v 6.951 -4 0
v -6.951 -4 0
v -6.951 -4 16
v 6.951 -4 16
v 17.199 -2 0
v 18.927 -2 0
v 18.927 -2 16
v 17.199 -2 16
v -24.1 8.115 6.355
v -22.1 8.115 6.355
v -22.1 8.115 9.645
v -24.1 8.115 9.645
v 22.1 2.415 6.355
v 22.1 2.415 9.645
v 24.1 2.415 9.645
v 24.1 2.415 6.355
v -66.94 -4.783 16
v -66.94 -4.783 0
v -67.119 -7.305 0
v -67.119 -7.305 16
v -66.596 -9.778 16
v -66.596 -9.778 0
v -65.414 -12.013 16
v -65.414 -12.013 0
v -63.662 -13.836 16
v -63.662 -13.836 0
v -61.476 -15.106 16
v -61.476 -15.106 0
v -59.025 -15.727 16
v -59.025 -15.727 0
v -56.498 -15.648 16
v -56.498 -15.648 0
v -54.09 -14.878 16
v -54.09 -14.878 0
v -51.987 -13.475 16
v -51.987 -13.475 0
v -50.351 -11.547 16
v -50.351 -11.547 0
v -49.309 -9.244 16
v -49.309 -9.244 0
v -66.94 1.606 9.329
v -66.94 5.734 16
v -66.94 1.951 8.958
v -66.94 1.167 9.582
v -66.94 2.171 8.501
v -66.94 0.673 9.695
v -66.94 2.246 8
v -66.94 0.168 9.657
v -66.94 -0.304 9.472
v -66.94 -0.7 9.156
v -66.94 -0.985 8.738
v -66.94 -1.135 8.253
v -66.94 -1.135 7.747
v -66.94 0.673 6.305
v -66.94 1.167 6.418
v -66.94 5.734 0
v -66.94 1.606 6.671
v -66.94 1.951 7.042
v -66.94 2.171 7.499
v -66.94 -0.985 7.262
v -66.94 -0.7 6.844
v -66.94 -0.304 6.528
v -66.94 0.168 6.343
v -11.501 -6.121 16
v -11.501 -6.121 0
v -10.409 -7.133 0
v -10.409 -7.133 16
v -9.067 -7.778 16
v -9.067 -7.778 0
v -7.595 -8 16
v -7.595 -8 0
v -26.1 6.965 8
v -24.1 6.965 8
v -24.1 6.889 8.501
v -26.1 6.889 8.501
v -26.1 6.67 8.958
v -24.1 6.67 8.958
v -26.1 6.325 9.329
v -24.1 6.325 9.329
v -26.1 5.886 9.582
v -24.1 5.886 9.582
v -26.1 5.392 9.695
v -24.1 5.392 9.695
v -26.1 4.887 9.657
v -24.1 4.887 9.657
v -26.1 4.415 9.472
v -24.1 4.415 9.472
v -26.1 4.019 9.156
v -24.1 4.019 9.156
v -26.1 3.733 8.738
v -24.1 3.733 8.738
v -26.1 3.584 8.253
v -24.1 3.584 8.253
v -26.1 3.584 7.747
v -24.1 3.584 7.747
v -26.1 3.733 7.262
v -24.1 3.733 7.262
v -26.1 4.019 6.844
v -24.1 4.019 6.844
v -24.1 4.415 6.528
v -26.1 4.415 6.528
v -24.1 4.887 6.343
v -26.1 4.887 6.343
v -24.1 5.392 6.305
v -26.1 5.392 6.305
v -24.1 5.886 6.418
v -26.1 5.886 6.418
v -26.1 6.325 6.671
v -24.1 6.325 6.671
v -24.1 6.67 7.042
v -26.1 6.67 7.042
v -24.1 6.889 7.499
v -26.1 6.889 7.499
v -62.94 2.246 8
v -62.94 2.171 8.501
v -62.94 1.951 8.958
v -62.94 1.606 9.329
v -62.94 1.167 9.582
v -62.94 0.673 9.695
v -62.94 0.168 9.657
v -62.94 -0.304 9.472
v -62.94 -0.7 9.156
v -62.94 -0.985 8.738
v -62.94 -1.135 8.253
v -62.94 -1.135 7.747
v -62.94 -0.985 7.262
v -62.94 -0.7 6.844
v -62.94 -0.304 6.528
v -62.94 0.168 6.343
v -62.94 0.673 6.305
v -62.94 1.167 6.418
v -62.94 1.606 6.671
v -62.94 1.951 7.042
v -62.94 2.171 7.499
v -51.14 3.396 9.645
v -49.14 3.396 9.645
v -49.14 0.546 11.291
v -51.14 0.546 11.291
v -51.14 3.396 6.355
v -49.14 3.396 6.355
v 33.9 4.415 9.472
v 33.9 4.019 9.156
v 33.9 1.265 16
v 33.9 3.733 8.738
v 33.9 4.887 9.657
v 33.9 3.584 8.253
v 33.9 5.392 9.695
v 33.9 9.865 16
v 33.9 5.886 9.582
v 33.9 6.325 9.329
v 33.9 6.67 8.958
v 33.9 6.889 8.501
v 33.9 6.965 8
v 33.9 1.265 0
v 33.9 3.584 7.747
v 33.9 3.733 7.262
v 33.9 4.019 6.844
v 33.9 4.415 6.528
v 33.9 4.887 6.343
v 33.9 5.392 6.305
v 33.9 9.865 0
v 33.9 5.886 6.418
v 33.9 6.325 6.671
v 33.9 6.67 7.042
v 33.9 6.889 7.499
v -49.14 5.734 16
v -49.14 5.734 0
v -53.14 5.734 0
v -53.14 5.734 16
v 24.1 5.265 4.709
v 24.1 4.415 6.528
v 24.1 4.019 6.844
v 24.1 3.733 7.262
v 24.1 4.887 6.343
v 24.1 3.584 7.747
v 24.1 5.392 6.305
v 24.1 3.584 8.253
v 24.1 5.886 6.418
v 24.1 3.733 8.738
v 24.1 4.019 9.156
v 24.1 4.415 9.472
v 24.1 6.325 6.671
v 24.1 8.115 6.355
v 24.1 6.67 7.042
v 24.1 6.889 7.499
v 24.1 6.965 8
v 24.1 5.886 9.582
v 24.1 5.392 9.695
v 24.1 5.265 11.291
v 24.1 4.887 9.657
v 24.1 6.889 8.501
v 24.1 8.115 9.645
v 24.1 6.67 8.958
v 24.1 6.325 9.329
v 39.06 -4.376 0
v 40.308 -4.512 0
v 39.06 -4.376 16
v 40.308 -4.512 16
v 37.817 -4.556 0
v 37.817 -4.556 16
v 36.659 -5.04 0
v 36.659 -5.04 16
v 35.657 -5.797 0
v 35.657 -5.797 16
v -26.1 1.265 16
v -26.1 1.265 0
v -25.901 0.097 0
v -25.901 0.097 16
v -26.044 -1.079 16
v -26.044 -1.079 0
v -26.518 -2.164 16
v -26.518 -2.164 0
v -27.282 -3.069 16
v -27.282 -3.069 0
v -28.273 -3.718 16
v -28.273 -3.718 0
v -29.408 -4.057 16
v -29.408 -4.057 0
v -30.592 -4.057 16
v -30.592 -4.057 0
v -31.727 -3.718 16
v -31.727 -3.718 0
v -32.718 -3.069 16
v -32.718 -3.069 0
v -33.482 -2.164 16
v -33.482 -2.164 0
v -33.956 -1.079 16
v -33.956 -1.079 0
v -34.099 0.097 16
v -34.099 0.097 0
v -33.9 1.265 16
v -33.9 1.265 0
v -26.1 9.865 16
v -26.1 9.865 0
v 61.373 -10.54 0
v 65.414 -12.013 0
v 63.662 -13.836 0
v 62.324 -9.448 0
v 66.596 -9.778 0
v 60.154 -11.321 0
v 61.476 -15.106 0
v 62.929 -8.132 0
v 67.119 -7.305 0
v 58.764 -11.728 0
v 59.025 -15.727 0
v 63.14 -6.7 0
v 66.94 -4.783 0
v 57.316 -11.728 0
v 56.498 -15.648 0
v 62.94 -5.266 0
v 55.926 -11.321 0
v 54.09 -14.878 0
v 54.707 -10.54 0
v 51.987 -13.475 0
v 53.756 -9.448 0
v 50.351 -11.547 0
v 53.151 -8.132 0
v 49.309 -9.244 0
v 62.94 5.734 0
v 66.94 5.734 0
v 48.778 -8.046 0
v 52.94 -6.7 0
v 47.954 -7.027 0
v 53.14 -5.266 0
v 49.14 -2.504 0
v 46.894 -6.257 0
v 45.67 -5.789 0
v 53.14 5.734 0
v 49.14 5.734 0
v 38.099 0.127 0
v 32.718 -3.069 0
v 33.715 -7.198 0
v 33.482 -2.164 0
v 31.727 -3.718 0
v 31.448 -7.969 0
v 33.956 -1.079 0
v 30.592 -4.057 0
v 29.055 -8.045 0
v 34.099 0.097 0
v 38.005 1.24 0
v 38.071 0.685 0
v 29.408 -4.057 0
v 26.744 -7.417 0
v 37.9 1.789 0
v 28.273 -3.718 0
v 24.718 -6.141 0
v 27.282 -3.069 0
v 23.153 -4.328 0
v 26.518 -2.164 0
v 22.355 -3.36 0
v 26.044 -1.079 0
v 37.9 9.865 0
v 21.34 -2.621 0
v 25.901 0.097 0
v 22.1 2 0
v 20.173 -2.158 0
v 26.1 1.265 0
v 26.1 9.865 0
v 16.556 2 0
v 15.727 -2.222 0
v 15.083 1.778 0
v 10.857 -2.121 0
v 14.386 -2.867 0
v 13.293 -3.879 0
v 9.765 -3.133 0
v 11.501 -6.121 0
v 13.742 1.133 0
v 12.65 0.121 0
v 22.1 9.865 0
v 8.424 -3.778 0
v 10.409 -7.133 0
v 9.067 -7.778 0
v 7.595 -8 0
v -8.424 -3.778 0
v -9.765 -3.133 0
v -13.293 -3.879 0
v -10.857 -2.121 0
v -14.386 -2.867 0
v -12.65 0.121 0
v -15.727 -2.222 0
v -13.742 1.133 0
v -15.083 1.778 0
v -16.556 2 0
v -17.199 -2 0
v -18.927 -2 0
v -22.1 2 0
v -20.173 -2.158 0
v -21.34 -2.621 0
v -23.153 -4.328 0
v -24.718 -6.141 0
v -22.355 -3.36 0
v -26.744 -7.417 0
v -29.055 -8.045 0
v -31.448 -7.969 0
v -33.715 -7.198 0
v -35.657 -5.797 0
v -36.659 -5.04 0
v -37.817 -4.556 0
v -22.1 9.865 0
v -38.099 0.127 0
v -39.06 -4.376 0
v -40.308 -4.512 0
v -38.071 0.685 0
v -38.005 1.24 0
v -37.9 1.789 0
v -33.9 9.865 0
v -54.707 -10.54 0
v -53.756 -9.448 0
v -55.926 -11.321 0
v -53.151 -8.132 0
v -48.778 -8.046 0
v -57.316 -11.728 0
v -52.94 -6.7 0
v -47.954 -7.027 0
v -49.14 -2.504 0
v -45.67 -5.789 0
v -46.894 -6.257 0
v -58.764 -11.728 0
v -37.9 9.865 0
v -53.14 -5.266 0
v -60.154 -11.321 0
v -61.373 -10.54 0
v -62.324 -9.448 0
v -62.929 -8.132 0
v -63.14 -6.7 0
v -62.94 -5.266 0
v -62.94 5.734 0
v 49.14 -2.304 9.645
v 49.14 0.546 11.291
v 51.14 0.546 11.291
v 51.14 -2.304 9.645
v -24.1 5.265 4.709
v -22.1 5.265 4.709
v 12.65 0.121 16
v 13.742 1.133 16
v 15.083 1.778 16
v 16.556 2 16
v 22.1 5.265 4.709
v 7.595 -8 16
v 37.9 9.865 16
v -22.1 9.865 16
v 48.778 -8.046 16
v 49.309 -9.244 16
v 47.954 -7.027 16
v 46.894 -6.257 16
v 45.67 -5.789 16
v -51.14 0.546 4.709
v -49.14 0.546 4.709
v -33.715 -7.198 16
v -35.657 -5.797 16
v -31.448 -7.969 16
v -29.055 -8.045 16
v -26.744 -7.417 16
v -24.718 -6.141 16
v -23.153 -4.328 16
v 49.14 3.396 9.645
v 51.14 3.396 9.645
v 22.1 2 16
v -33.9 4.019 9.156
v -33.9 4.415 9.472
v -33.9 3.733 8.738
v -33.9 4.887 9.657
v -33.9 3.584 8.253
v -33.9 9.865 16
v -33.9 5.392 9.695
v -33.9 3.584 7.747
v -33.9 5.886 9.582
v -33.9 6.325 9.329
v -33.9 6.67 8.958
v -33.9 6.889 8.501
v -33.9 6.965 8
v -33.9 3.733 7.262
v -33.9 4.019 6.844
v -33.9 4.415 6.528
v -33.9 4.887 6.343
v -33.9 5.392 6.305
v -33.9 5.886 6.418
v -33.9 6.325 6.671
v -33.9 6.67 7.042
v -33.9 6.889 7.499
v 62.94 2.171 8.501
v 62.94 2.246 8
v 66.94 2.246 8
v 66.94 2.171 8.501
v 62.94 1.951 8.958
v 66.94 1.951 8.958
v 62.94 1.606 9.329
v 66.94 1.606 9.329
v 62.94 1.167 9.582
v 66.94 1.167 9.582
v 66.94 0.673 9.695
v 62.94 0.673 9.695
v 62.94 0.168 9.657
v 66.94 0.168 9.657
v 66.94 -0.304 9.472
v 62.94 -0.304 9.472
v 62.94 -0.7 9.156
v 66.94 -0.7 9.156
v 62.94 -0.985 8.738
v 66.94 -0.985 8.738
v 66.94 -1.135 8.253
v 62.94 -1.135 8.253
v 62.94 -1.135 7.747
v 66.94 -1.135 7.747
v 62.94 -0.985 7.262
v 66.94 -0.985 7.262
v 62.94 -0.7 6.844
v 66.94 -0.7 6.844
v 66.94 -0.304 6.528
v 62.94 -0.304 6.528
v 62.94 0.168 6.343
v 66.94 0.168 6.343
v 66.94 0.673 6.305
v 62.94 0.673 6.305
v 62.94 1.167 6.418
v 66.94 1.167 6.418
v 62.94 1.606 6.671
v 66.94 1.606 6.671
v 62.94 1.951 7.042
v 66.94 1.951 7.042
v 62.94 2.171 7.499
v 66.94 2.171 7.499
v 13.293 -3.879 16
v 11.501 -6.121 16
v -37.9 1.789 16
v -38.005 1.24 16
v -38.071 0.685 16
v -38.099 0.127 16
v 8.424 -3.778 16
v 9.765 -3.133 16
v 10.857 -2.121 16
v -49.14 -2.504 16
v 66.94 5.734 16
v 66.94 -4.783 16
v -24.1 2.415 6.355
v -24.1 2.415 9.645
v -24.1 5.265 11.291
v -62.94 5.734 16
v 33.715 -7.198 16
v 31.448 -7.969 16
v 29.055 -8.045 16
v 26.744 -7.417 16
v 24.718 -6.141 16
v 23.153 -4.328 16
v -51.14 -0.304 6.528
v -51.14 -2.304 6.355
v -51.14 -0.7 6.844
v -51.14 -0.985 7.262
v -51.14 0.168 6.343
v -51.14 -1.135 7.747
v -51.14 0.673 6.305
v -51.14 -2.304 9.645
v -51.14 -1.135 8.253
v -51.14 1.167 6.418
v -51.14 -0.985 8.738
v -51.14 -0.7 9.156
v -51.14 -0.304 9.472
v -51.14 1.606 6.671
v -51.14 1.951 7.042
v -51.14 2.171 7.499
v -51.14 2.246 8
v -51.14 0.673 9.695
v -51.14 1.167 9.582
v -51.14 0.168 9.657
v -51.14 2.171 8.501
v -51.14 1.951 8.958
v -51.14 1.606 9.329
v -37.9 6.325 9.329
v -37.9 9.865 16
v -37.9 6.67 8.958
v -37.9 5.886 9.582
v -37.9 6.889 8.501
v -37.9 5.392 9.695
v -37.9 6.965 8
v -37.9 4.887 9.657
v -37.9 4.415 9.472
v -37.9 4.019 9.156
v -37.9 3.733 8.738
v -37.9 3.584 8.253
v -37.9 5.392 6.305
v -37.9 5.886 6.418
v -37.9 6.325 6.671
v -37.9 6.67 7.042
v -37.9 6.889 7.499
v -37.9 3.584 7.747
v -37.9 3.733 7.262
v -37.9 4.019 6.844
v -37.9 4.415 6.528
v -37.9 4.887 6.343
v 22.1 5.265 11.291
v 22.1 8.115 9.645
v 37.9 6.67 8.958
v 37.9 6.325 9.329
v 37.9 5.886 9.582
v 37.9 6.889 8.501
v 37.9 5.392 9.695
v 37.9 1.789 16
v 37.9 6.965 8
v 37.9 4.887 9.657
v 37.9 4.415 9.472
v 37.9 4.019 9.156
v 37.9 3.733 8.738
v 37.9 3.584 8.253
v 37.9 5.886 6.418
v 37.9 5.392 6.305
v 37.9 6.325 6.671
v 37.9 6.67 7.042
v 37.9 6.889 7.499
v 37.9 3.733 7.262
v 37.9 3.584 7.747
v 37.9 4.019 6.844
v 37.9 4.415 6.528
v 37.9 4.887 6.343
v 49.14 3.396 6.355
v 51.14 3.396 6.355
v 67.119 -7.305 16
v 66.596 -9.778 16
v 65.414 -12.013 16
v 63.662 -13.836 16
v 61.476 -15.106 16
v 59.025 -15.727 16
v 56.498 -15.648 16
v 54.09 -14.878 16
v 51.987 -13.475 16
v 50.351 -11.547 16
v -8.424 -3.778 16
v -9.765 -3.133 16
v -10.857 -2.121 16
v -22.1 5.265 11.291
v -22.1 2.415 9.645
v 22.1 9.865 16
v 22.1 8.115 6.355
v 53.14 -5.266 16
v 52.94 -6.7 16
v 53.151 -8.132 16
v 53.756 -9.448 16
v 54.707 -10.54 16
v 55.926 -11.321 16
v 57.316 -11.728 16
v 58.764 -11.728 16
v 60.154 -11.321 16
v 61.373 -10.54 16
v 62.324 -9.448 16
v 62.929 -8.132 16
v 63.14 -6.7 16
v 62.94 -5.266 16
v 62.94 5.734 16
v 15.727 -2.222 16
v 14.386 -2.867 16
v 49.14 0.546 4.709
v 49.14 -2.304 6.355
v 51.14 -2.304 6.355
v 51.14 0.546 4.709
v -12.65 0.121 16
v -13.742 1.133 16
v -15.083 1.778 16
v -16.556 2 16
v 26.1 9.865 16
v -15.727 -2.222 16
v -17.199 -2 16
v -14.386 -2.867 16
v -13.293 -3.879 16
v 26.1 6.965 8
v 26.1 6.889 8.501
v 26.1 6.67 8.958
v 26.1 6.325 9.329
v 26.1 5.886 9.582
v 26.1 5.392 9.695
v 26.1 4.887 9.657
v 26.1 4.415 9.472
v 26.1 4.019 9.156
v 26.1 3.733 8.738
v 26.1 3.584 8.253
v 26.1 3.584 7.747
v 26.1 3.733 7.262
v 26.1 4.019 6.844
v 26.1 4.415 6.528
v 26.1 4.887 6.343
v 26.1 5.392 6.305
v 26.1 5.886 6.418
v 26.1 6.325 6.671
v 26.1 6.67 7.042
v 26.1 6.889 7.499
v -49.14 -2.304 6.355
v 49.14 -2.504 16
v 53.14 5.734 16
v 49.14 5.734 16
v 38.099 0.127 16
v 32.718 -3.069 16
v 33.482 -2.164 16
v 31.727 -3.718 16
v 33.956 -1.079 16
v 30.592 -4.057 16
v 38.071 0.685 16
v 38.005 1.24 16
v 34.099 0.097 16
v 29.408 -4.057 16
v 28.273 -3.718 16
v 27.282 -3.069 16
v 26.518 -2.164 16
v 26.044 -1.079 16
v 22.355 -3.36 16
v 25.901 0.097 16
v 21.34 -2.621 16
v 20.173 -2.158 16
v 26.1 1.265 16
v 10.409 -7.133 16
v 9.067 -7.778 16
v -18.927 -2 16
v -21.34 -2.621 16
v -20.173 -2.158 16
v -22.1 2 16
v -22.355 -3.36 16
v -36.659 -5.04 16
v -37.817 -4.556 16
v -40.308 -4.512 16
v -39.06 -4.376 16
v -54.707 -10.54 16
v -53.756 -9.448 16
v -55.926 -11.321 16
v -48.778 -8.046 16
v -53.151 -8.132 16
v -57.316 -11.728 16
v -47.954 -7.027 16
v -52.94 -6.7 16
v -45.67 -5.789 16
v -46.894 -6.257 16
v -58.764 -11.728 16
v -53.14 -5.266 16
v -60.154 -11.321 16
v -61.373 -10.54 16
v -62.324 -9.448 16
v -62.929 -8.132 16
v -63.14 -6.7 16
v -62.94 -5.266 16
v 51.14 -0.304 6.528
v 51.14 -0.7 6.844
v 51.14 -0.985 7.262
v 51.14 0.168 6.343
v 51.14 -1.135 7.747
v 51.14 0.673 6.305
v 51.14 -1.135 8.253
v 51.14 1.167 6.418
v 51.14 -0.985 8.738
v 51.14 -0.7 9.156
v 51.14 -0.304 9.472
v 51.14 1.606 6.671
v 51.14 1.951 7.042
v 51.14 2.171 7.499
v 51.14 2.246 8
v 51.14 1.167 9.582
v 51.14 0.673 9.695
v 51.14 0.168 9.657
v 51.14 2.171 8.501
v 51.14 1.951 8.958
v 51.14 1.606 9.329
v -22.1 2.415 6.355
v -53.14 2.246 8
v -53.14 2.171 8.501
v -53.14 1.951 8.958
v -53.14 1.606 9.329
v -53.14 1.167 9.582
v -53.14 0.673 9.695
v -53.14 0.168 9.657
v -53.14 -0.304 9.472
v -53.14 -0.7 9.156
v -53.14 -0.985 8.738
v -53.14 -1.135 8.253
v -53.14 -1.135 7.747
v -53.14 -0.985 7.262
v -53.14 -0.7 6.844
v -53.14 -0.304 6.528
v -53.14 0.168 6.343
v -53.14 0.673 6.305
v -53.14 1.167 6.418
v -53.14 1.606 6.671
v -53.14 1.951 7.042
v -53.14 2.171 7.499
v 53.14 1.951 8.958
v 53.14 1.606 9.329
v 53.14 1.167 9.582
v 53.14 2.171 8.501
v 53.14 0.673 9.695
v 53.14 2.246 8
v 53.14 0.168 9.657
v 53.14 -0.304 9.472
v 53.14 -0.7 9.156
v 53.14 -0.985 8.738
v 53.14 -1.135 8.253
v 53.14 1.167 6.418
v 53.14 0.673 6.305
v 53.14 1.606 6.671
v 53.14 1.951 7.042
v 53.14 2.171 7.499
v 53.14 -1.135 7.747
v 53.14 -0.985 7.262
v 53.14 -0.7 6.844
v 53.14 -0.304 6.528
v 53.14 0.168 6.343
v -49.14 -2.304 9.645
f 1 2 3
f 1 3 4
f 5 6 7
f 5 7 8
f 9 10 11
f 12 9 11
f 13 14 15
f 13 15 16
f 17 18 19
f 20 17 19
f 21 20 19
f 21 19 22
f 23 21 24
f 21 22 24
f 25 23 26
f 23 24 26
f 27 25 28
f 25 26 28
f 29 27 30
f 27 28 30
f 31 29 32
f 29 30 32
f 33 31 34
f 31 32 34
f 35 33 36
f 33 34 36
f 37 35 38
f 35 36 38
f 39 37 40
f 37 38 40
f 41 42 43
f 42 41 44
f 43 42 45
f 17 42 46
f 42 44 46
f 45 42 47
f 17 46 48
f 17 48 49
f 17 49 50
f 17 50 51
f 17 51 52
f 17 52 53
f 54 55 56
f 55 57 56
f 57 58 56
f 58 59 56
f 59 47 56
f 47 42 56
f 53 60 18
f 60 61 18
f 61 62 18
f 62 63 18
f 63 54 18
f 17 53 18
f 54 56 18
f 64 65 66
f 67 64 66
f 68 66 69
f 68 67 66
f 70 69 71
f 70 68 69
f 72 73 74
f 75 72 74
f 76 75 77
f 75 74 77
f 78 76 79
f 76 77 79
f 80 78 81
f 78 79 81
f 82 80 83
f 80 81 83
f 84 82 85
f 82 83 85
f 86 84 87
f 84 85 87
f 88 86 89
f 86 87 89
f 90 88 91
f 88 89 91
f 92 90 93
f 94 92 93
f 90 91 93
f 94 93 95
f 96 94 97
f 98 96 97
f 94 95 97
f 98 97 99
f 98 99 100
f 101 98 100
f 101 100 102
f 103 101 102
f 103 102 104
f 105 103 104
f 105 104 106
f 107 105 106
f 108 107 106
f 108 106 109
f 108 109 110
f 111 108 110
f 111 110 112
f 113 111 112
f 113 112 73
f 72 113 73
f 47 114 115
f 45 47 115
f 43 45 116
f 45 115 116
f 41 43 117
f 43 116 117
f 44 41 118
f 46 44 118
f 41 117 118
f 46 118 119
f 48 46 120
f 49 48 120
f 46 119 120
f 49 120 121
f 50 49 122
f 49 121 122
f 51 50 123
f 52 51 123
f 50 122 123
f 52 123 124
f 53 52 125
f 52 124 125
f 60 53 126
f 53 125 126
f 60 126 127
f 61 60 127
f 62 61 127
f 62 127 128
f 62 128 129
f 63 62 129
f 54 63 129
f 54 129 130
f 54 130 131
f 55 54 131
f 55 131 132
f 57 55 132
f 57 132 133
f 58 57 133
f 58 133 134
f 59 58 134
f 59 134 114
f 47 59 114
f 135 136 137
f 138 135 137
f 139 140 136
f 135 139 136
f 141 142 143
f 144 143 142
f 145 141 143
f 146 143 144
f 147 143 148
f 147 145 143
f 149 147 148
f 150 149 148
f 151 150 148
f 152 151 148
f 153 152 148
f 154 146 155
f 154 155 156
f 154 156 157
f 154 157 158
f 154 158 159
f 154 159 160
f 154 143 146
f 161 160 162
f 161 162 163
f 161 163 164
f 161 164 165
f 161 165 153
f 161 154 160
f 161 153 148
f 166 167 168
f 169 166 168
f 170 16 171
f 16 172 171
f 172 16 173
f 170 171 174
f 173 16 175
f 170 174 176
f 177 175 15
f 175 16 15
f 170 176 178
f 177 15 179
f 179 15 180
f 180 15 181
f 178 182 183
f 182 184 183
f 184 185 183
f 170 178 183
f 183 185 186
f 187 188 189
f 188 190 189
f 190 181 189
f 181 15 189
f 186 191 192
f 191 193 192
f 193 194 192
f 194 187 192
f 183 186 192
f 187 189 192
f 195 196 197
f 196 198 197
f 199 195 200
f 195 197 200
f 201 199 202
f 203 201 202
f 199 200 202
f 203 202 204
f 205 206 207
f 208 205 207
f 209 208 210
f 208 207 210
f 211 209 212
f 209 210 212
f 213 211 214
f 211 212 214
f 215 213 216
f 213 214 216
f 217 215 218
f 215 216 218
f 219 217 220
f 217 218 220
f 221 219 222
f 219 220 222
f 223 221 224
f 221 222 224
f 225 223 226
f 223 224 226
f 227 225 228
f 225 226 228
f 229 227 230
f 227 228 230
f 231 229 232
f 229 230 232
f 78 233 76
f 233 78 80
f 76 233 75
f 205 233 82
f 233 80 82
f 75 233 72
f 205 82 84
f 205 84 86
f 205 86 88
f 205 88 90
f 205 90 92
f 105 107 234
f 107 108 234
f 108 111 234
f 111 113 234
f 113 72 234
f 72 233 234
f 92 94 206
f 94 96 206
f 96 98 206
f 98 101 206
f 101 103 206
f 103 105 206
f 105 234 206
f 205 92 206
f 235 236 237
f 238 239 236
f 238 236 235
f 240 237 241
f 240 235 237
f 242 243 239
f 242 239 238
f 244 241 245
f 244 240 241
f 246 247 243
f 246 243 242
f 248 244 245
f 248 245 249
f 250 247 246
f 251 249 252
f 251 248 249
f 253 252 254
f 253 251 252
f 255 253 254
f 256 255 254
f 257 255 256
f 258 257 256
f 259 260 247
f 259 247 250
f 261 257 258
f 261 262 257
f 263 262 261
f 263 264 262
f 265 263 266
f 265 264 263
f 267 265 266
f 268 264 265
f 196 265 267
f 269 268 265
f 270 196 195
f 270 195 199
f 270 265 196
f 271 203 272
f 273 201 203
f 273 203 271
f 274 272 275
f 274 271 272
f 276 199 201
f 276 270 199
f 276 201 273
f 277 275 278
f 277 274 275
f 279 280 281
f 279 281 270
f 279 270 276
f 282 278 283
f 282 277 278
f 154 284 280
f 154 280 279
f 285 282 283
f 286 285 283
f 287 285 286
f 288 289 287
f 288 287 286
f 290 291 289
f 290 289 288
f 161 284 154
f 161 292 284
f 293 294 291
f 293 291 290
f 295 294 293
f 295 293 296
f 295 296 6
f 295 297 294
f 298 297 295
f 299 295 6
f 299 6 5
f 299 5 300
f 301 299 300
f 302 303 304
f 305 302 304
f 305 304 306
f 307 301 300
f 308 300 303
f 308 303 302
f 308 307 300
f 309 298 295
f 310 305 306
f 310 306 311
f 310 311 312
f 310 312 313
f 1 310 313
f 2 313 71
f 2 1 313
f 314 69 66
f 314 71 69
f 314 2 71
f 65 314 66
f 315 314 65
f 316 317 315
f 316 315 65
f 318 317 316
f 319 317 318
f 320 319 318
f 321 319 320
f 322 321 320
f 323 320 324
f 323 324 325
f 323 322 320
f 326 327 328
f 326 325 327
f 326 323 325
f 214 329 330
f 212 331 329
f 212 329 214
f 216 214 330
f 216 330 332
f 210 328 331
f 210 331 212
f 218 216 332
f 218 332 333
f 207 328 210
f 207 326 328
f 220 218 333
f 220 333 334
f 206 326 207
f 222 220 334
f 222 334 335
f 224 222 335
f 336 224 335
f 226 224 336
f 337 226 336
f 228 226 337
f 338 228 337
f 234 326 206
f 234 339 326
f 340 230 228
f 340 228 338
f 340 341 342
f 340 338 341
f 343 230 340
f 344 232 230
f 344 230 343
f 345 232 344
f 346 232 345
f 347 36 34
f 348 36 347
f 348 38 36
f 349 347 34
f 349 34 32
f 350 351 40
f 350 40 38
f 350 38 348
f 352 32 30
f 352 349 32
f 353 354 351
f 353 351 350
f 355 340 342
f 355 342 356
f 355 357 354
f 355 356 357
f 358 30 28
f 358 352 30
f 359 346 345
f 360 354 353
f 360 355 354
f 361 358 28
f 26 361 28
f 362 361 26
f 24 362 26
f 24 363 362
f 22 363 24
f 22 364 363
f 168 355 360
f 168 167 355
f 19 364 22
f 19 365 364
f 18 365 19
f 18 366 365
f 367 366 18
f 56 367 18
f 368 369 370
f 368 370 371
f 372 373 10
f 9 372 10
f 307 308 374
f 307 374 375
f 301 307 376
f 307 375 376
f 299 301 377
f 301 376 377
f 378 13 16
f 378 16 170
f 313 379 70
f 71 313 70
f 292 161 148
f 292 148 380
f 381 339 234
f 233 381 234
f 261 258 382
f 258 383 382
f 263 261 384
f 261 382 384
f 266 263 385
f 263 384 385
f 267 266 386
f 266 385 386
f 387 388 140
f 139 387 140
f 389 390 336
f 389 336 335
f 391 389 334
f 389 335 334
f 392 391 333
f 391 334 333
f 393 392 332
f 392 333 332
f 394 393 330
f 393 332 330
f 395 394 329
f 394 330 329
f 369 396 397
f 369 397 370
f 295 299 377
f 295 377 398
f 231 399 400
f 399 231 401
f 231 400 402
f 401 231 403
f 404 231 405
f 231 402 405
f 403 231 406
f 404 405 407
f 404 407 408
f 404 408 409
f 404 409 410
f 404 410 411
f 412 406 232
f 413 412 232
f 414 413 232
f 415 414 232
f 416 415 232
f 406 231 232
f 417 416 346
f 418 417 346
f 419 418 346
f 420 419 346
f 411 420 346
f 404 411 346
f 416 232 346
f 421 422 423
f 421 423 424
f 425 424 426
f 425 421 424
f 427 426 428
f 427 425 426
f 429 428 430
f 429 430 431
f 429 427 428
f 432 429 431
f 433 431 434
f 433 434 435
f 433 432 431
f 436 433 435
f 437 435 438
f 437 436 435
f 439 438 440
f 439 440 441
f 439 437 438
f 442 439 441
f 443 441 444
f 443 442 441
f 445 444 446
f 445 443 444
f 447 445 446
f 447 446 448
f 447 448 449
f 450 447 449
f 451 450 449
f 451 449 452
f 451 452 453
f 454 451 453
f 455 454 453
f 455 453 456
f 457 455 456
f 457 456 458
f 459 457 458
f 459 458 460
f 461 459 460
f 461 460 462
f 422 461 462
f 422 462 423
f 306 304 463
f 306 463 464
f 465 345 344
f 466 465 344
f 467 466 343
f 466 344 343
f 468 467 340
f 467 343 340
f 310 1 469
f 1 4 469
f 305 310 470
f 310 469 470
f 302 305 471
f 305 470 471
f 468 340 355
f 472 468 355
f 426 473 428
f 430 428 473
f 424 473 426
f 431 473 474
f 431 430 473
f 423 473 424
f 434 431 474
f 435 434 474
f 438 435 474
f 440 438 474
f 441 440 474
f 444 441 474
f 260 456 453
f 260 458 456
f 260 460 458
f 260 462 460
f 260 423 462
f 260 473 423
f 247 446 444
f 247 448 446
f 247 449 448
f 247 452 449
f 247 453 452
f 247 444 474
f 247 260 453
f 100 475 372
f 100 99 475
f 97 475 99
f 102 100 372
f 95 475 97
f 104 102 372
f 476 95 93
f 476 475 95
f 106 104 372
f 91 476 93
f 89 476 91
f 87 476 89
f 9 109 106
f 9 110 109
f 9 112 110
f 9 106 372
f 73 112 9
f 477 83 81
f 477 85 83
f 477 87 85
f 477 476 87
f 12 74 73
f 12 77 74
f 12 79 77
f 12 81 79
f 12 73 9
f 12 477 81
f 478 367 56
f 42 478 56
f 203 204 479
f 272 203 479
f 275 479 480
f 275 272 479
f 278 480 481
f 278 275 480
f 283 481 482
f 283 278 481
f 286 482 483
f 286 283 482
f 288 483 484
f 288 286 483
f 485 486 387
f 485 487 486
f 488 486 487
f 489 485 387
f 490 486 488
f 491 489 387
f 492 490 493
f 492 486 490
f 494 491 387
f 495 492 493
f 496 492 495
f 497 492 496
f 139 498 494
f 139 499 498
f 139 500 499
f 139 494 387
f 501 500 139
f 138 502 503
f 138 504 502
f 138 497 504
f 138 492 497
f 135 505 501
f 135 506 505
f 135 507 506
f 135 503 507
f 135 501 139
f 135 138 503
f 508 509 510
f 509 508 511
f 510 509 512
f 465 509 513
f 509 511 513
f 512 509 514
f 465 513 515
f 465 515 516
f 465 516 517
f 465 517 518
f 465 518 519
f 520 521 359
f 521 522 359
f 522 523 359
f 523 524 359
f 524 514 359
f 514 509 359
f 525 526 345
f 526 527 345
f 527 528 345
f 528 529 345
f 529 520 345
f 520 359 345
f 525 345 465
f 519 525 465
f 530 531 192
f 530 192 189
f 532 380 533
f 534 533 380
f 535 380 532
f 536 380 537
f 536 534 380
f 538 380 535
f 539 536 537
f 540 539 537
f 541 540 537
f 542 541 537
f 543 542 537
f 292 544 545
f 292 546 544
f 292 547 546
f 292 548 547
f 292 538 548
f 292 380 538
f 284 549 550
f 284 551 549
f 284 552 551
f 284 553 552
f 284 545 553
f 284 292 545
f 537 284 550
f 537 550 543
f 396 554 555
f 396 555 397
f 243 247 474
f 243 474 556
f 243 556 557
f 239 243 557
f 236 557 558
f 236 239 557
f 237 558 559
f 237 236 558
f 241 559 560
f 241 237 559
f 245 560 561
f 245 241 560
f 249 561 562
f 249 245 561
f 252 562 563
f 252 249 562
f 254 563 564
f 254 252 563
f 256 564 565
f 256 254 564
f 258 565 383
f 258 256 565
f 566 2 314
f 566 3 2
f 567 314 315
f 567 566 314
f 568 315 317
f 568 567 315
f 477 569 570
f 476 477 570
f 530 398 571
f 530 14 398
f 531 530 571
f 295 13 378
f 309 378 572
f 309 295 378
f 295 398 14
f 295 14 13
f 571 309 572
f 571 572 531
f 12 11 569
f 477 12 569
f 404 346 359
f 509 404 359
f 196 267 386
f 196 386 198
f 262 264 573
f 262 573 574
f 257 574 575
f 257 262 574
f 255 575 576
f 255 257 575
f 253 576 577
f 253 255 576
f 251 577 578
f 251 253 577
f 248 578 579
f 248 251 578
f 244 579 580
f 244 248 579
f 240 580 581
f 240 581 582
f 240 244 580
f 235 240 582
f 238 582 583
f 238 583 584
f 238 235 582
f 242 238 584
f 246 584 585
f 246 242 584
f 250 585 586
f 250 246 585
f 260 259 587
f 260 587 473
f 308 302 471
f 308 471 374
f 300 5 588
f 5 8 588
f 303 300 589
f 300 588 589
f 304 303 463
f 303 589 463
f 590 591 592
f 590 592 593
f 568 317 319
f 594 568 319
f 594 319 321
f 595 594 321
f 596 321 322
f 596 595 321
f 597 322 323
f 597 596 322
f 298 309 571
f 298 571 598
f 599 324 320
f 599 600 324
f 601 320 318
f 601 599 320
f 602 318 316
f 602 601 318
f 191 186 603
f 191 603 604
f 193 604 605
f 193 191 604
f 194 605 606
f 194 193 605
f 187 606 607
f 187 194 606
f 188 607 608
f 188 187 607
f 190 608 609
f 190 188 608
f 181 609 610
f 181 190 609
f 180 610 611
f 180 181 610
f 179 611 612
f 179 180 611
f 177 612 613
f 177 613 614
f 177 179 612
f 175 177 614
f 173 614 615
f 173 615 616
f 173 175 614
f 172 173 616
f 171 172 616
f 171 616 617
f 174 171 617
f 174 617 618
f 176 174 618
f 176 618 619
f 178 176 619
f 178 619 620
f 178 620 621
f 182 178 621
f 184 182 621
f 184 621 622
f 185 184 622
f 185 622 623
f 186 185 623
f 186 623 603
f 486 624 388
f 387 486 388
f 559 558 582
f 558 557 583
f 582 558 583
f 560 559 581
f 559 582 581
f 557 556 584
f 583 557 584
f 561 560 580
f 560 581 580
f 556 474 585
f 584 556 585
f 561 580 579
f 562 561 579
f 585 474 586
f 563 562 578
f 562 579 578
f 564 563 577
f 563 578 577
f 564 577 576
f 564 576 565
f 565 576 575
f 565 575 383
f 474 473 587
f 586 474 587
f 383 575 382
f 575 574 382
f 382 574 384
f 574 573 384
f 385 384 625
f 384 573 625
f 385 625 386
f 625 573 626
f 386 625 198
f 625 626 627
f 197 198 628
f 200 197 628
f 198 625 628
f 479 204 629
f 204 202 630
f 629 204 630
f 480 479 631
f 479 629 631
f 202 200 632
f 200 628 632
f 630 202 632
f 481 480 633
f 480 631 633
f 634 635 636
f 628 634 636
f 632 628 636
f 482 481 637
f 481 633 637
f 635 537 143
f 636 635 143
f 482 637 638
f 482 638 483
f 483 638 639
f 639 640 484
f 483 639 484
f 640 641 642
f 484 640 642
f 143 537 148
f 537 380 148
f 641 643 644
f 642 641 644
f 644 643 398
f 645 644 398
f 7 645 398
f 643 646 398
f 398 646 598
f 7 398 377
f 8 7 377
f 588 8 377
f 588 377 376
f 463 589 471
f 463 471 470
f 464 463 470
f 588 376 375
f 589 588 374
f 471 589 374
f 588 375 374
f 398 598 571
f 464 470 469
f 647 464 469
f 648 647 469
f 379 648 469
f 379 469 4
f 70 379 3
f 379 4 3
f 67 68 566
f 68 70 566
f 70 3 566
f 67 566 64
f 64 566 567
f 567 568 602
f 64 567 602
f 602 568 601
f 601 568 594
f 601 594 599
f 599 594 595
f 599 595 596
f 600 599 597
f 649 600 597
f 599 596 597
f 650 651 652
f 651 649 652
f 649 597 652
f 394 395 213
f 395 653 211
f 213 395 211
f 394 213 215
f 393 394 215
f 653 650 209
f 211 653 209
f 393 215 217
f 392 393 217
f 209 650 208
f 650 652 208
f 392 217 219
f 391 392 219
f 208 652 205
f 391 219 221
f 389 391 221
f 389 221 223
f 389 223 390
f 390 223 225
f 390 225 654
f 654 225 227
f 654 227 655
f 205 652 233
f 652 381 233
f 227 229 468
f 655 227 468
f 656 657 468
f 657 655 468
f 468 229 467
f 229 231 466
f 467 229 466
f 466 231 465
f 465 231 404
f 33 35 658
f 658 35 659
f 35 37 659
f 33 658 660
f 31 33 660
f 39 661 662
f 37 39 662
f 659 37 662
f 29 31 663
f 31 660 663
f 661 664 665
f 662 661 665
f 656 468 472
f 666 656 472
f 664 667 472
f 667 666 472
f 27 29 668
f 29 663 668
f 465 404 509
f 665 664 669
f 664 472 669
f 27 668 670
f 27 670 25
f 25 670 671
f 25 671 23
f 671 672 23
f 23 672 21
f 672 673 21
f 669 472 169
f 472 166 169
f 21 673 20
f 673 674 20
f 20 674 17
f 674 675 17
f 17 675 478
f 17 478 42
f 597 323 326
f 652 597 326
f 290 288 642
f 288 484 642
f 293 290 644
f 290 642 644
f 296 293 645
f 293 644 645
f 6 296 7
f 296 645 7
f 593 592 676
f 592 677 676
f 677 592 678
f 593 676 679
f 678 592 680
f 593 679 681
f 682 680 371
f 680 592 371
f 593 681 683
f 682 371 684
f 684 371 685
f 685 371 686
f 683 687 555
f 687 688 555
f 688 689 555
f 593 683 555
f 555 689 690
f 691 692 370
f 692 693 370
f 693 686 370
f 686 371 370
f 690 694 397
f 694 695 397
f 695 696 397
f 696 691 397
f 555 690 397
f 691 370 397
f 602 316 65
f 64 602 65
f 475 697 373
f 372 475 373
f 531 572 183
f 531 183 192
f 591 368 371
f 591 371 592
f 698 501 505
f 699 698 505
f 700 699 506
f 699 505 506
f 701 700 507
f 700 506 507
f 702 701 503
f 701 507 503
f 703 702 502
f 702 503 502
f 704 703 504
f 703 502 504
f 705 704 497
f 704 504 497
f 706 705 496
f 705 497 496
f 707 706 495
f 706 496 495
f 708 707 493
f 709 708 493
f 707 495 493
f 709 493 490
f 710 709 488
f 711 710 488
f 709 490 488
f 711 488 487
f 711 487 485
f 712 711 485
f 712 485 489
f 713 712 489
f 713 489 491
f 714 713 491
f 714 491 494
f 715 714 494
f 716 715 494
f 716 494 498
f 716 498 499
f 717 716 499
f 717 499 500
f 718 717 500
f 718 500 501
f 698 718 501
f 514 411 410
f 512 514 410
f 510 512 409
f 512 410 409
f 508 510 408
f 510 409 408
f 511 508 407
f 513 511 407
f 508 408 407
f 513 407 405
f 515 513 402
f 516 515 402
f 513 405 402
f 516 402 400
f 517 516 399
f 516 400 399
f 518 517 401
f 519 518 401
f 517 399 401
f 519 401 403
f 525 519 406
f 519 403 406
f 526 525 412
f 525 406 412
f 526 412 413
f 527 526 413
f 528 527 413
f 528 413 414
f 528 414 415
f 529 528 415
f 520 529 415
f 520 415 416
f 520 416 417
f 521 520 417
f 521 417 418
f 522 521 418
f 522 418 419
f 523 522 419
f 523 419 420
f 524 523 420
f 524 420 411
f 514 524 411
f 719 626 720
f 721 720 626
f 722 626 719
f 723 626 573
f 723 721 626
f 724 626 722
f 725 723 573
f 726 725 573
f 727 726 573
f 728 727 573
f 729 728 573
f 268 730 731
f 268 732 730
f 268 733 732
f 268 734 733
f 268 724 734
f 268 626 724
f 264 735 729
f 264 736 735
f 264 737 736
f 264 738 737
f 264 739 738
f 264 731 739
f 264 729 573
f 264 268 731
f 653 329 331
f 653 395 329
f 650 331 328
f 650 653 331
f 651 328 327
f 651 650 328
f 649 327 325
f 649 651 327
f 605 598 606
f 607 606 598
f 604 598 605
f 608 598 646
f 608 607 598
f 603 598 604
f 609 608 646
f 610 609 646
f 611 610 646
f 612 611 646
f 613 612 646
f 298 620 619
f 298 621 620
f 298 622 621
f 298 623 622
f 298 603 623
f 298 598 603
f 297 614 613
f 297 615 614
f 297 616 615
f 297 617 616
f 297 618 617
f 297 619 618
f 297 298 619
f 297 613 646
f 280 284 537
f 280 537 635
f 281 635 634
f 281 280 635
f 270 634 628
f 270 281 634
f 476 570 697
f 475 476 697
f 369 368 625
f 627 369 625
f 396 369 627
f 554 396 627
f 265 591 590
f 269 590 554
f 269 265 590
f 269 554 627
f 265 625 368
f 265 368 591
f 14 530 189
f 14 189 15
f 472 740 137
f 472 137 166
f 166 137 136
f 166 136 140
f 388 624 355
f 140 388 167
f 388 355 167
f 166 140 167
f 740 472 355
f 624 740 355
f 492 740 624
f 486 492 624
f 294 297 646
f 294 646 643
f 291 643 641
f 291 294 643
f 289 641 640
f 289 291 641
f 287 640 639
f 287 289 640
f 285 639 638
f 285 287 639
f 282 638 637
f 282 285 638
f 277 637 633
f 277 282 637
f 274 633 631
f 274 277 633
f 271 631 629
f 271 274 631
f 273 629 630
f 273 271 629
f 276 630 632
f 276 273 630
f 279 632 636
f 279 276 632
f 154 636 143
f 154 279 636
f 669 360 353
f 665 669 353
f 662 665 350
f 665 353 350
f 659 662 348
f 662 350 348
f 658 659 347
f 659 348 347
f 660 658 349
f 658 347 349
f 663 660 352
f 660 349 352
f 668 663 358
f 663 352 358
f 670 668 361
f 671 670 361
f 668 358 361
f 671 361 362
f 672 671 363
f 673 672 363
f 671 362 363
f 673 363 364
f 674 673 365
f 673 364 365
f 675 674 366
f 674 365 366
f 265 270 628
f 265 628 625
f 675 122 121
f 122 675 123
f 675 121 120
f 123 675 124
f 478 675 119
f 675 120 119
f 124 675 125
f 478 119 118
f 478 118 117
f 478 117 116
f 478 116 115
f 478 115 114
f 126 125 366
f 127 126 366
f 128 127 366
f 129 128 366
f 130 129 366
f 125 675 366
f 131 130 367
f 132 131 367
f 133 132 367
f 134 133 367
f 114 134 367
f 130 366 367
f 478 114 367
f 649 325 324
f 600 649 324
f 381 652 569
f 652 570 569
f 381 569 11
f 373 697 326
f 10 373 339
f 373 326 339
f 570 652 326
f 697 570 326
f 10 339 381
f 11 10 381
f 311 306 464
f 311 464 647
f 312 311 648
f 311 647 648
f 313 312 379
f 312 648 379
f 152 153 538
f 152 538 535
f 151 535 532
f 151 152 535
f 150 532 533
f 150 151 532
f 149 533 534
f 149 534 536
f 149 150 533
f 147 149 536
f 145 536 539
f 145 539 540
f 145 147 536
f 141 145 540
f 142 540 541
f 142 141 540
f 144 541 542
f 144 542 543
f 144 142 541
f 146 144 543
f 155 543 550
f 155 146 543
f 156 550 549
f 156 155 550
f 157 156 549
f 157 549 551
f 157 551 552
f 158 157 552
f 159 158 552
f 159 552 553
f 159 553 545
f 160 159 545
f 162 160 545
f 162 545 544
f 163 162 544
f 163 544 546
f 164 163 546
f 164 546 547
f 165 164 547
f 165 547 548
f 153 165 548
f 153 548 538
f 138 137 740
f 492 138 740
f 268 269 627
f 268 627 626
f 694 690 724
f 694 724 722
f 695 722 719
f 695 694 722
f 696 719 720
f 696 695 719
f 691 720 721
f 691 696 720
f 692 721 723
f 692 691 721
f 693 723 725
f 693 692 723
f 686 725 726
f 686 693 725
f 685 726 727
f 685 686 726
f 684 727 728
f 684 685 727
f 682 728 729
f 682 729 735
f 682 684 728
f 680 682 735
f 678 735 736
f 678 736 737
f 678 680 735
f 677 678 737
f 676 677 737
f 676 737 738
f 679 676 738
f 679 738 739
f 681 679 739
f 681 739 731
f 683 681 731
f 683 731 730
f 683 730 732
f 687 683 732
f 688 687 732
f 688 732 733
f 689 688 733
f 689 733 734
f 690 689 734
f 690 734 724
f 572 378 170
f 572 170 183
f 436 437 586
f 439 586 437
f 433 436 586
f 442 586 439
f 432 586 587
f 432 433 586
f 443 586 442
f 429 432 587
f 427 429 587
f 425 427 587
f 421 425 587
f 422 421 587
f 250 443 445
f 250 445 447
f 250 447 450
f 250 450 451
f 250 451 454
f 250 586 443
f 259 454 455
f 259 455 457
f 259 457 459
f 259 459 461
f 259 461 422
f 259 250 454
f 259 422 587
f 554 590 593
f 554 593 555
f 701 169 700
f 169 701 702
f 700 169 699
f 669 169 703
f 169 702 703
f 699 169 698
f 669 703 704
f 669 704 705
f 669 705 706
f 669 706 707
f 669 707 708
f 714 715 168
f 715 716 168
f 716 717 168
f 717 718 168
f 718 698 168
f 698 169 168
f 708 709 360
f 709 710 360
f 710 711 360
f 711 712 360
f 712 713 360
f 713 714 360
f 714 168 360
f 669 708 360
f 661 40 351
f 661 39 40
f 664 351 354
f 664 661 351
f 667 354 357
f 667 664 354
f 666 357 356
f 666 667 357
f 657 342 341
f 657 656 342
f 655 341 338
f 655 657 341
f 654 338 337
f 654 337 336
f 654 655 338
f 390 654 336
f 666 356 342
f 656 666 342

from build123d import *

# Parameters (mm, degrees)
F1_DEPTH = 16
F2_R     = 1.7
F3_DEPTH = 15.8
F4_DEPTH = 2
F5_R     = 1.7
F6_DEPTH = 17.8
F7_DEPTH = 2
F8_R     = 5


# Not quite as in the source:
# - a feature names something its author has since deleted; it is built from what else it names


with BuildPart() as f1:
    # F0 (on Top) → F1 (new body)
    with BuildSketch(Plane.XY):
        with BuildLine():
            ThreePointArc((-26.1, 1.2649110641), (-30, -4.1), (-33.9, 1.2649110641))
            Line((-33.9, 1.2649110641), (-33.9, 7.0992957397))
            ThreePointArc((-33.9, 7.0992957397), (-36.4699456608, 4.8733769756), (-37.9, 1.788854382))
            ThreePointArc((-37.9, 1.788854382), (-38.0425692419, 0.9628499311), (-38.0990116086, 0.1265344399))
            ThreePointArc((-38.0990116086, 0.1265344399), (-37.8794890645, -1.8771393349), (-37.1720292209, -3.7645712709))
            ThreePointArc((-37.1720292209, -3.7645712709), (-29.054976567, -8.0446833817), (-22.1507962187, -2))
            ThreePointArc((-22.1507962187, -2), (-21.9, 0), (-22.1507962187, 2))
            ThreePointArc((-22.1507962187, 2), (-23.5959659875, 4.9596722035), (-26.1, 7.0992957397))
            Line((-26.1, 7.0992957397), (-26.1, 1.2649110641))
        make_face()
        with BuildLine():
            ThreePointArc((-37.9, 1.788854382), (-36.4699456608, 4.8733769756), (-33.9, 7.0992957397))
            Line((-33.9, 7.0992957397), (-33.9, 9.8649110641))
            Line((-33.9, 9.8649110641), (-37.9, 9.8649110641))
            Line((-37.9, 9.8649110641), (-37.9, 1.788854382))
        make_face()
        with BuildLine():
            Line((-26.1, 9.8649110641), (-26.1, 7.0992957397))
            ThreePointArc((-26.1, 7.0992957397), (-23.5959659875, 4.9596722035), (-22.1507962187, 2))
            Line((-22.1507962187, 2), (-22.1, 2))
            Line((-22.1, 2), (-22.1, 9.8649110641))
            Line((-22.1, 9.8649110641), (-26.1, 9.8649110641))
        make_face()
        with BuildLine():
            Line((-22.1, 2), (-22.1507962187, 2))
            ThreePointArc((-22.1507962187, 2), (-21.9, 0), (-22.1507962187, -2))
            Line((-22.1507962187, -2), (-16.1507962187, -2))
            Line((-16.1507962187, -2), (-14.7945886775, -2))
            Line((-14.7945886775, -2), (-10, -8))
            Line((-10, -8), (0, -8))
            Line((0, -8), (0, -4))
            Line((0, -4), (-6, -4))
            Line((-6, -4), (-9.3562075412, -4))
            Line((-9.3562075412, -4), (-14.1507962187, 2))
            Line((-14.1507962187, 2), (-22.1, 2))
        make_face()
        with BuildLine():
            ThreePointArc((-37.1720292209, -3.7645712709), (-37.8794890645, -1.8771393349), (-38.0990116086, 0.1265344399))
            Line((-38.0990116086, 0.1265344399), (-49.14, -2.5037723523))
            Line((-49.14, -2.5037723523), (-49.14, -4.7826334039))
            ThreePointArc((-49.14, -4.7826334039), (-48.9961671585, -5.6705013446), (-48.9406864116, -6.5682314005))
            Line((-48.9406864116, -6.5682314005), (-37.1720292209, -3.7645712709))
        make_face()
        with BuildLine():
            Line((-49.14, -4.7826334039), (-49.14, -2.5037723523))
            Line((-49.14, -2.5037723523), (-49.8676687992, -2.6771256897))
            ThreePointArc((-49.8676687992, -2.6771256897), (-49.4391620268, -3.7075286109), (-49.14, -4.7826334039))
        make_face()
        with BuildLine():
            Line((-49.8676687992, -2.6771256897), (-49.14, -2.5037723523))
            Line((-49.14, -2.5037723523), (-49.14, 5.7342135624))
            Line((-49.14, 5.7342135624), (-53.14, 5.7342135624))
            Line((-53.14, 5.7342135624), (-53.14, 0.9881158051))
            ThreePointArc((-53.14, 0.9881158051), (-51.2517778793, -0.6194686338), (-49.8676687992, -2.6771256897))
        make_face()
        with BuildLine():
            ThreePointArc((-66.94, -4.7826334039), (-58.9383437694, -15.7355495952), (-48.9406864116, -6.5682314005))
            ThreePointArc((-48.9406864116, -6.5682314005), (-48.9961671585, -5.6705013446), (-49.14, -4.7826334039))
            ThreePointArc((-49.14, -4.7826334039), (-49.4391620268, -3.7075286109), (-49.8676687992, -2.6771256897))
            ThreePointArc((-49.8676687992, -2.6771256897), (-51.2517778793, -0.6194686338), (-53.14, 0.9881158051))
            Line((-53.14, 0.9881158051), (-53.14, -5.2657864376))
            ThreePointArc((-53.14, -5.2657864376), (-58.04, -11.78), (-62.94, -5.2657864376))
            Line((-62.94, -5.2657864376), (-62.94, 0.9881158051))
            ThreePointArc((-62.94, 0.9881158051), (-65.5189963637, -1.4959269496), (-66.94, -4.7826334039))
        make_face()
        with BuildLine():
            Line((-66.94, 5.7342135624), (-66.94, -4.7826334039))
            ThreePointArc((-66.94, -4.7826334039), (-65.5189963637, -1.4959269496), (-62.94, 0.9881158051))
            Line((-62.94, 0.9881158051), (-62.94, 5.7342135624))
            Line((-62.94, 5.7342135624), (-66.94, 5.7342135624))
        make_face()
    extrude(amount=F1_DEPTH)

    # F2 (on face) → F3 (cut, through all)
    with BuildSketch(Plane.YZ.offset(-22.1)):
        with Locations((5.2649110641, 8)):
            Circle(F2_R)
    extrude(amount=-F3_DEPTH, mode=Mode.SUBTRACT)

    # F2 (on face) → F4 (cut)
    with BuildSketch(Plane.YZ.offset(-22.1)):
        Polygon((8.1149110641, 6.3545517328), (8.1149110641, 9.6454482672), (5.2649110641, 11.2908965344), (2.4149110641, 9.6454482672), (2.4149110641, 6.3545517328), (5.2649110641, 4.7091034656), align=None)
        with Locations((5.2649110641, 8)):
            Circle(F2_R, mode=Mode.SUBTRACT)
    extrude(amount=-F4_DEPTH, mode=Mode.SUBTRACT)

    # F5 (on face) → F6 (cut, through all)
    with BuildSketch(Plane.YZ.offset(-49.14)):
        with Locations((0.5462276477, 8)):
            Circle(F5_R)
    extrude(amount=-F6_DEPTH, mode=Mode.SUBTRACT)

    # F5 (on face) → F7 (cut)
    with BuildSketch(Plane.YZ.offset(-49.14)):
        Polygon((3.3962276477, 6.3545517328), (3.3962276477, 9.6454482672), (0.5462276477, 11.2908965344), (-2.3037723523, 9.6454482672), (-2.3037723523, 6.3545517328), (0.5462276477, 4.7091034656), align=None)
        with Locations((0.5462276477, 8)):
            Circle(F5_R, mode=Mode.SUBTRACT)
    extrude(amount=-F7_DEPTH, mode=Mode.SUBTRACT)

    # F8
    f8_edges = [f1.edges().sort_by_distance(p)[0] for p in [
        (-48.940686, -6.568231, 8),
        (-37.172029, -3.764571, 8),
        (-22.150796, -2, 8),
        (-14.794589, -2, 8),
        (-10, -8, 8),
        (-9.356208, -4, 8),
        (-14.150796, 2, 8),
    ]]
    fillet(f8_edges, radius=F8_R)

    # F9: F1 across plane


with BuildPart() as f1_1:
    add(f1.part)
    add(f1.part.mirror(Plane.YZ))


solid = f1_1.part
